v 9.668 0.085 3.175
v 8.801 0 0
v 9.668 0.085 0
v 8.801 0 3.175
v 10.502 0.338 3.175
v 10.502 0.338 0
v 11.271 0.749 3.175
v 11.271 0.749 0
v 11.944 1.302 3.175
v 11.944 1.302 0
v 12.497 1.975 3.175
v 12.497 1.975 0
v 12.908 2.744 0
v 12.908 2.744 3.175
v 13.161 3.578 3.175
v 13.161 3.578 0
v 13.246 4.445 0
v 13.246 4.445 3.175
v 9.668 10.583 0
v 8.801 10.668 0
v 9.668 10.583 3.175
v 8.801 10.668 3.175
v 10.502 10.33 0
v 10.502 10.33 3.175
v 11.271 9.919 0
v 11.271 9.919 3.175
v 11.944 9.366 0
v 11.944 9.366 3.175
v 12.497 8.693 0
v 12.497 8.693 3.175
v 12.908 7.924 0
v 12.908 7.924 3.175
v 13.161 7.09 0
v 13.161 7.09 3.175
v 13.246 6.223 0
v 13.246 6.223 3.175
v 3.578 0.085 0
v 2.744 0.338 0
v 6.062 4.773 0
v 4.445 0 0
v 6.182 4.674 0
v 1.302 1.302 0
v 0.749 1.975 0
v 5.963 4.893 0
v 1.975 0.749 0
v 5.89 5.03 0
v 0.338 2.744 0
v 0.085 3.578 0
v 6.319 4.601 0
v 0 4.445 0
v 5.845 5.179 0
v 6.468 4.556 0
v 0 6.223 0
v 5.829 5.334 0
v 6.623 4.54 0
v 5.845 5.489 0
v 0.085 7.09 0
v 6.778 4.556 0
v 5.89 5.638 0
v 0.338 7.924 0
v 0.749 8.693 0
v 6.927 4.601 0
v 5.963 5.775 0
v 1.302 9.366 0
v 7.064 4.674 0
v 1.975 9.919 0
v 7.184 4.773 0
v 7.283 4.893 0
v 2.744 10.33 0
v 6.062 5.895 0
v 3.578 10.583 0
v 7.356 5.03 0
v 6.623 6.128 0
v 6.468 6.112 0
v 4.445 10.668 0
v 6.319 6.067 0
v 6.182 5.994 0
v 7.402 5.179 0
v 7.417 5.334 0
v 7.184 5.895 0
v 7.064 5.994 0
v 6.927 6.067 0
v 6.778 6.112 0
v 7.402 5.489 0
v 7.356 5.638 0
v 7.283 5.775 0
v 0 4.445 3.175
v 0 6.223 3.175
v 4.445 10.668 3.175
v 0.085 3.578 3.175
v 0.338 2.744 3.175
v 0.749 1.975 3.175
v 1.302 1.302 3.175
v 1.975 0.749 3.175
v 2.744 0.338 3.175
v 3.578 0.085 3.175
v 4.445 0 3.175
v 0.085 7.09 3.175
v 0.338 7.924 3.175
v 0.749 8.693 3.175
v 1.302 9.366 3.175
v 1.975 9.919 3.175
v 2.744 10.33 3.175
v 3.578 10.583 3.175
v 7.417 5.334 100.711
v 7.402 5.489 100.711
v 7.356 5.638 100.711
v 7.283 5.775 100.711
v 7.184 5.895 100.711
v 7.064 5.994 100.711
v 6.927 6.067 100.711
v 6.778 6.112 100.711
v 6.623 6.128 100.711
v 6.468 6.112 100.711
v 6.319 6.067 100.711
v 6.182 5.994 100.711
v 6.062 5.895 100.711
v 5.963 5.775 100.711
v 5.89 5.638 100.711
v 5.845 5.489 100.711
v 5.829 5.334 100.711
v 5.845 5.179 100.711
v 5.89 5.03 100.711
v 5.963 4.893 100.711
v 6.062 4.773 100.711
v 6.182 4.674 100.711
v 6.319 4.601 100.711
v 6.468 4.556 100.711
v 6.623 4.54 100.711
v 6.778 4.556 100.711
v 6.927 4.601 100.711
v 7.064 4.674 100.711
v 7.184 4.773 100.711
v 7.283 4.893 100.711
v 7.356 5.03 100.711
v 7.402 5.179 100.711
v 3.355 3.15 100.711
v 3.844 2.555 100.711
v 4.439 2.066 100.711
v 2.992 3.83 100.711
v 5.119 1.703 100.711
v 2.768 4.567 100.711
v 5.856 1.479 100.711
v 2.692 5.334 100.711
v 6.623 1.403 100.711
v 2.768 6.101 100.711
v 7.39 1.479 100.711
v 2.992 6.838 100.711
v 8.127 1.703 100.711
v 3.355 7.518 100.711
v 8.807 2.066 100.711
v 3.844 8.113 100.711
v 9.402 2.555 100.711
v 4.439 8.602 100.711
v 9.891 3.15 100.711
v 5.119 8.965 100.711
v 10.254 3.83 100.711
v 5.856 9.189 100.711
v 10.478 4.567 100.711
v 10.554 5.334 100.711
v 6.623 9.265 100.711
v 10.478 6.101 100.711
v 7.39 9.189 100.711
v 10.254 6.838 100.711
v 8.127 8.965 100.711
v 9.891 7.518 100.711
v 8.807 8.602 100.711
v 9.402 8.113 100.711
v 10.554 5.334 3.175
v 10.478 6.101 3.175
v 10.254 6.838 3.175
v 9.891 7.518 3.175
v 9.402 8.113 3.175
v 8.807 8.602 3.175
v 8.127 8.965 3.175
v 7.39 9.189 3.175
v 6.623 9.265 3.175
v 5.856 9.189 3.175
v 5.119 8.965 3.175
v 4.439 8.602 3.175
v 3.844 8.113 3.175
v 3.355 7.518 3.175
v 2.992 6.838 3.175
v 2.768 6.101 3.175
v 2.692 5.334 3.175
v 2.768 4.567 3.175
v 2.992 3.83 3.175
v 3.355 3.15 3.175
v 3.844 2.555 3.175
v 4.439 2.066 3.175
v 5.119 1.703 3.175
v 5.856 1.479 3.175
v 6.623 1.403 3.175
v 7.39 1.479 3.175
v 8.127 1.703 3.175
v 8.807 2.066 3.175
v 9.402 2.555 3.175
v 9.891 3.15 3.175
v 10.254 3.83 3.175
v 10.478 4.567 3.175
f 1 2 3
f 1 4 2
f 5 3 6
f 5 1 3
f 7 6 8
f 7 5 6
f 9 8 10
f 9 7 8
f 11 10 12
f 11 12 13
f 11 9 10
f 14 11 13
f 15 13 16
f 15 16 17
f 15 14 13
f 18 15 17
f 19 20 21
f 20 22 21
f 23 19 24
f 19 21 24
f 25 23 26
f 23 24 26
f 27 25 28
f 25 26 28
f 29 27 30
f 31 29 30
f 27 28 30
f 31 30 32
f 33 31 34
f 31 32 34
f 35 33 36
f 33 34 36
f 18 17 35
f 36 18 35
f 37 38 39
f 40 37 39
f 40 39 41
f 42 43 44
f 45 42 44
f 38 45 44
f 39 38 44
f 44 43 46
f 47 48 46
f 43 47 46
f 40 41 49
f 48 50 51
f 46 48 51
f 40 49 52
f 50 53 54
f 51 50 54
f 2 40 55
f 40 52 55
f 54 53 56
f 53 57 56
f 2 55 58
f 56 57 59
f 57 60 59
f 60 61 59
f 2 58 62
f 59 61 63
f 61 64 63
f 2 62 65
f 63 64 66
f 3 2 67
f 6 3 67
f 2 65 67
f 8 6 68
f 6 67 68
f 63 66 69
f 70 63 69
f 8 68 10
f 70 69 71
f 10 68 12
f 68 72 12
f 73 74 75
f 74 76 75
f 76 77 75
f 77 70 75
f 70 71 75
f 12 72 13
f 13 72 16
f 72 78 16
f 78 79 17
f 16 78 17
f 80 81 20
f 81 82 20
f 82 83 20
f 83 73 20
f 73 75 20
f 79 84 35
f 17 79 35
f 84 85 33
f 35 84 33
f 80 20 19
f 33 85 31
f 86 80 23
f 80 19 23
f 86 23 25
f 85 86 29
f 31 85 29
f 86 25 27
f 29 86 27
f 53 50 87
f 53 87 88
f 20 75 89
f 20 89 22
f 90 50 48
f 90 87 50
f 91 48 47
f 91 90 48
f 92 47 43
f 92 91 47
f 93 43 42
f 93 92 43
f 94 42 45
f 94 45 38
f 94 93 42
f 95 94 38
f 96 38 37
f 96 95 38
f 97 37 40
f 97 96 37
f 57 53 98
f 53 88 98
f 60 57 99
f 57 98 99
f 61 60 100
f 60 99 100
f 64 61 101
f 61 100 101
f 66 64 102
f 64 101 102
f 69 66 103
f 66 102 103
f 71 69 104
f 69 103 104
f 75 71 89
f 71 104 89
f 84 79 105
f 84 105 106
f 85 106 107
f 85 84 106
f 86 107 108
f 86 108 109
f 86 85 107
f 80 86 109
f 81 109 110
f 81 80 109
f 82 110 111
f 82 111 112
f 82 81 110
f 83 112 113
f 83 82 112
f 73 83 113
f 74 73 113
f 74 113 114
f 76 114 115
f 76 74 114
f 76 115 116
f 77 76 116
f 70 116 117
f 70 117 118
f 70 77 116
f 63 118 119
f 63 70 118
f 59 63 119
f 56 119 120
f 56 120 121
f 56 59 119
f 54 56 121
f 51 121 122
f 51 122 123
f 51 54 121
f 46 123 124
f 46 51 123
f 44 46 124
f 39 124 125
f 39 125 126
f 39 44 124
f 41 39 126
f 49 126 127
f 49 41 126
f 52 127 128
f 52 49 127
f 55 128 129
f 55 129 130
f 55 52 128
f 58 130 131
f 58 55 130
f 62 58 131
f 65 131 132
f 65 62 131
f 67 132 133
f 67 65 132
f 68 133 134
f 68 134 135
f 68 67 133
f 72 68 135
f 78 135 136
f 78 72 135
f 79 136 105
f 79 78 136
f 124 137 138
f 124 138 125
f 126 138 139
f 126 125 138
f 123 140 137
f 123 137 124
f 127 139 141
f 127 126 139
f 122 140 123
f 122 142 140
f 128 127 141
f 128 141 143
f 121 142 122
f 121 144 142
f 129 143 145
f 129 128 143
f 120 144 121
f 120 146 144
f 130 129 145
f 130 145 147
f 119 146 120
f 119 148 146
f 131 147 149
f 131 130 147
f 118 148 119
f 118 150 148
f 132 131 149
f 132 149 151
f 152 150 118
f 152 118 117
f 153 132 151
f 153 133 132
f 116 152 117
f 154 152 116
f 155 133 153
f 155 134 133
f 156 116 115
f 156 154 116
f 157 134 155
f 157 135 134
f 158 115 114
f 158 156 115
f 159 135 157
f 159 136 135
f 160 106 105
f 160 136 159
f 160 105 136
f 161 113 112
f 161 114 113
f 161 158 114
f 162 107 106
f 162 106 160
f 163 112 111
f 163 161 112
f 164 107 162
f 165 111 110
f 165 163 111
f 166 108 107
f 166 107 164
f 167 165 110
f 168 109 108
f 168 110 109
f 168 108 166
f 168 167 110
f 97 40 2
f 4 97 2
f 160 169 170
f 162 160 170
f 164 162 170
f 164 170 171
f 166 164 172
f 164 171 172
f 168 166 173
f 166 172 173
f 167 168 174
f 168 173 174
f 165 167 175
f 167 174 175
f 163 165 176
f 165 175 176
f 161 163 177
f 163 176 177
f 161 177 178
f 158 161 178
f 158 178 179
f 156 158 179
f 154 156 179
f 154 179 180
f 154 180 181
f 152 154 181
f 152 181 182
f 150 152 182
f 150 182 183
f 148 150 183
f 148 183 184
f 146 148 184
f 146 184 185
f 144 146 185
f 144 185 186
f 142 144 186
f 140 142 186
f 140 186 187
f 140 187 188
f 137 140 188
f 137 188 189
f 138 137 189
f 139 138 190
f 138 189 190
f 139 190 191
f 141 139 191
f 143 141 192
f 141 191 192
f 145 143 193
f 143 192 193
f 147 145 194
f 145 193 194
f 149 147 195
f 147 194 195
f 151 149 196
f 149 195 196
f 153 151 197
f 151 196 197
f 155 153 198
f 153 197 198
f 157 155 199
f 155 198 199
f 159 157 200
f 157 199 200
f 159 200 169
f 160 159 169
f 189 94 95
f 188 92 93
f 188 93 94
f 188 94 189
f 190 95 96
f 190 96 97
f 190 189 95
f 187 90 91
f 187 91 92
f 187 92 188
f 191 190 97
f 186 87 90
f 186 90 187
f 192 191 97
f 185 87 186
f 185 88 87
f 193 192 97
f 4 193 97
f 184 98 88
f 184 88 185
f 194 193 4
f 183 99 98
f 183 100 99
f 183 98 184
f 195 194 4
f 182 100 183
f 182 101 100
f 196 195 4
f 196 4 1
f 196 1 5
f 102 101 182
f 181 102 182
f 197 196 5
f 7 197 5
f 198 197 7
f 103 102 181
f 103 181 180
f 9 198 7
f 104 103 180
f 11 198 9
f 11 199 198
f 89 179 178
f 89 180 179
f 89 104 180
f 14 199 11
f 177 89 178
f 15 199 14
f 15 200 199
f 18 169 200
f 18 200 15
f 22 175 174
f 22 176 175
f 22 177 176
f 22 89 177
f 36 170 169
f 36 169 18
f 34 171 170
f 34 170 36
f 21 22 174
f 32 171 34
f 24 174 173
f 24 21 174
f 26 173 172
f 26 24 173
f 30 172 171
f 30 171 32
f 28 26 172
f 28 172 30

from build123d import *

# Parameters (mm, degrees)
SKETCH1_W           = 13.2461
SKETCH1_H           = 10.668
SKETCH1_R           = 3.93065
BOSS_EXTRUDE1_DEPTH = 3.175
SKETCH1_2_R         = 3.93065
SKETCH1_2_R_2       = 0.79375
BOSS_EXTRUDE2_DEPTH = 100.711
FILLET1_R           = 4.445


with BuildPart() as part:
    # Sketch1 → Boss-Extrude1 (new body)
    with BuildSketch(Plane.XY):
        with Locations((6.62305, 5.334)):
            Rectangle(SKETCH1_W, SKETCH1_H)
        with Locations((6.62305, 5.334)):
            Circle(SKETCH1_R, mode=Mode.SUBTRACT)
    extrude(amount=BOSS_EXTRUDE1_DEPTH)

    # Sketch1<2> → Boss-Extrude2 (add)
    with BuildSketch(Plane.XY):
        with Locations((6.62305, 5.334)):
            Circle(SKETCH1_2_R)
        with Locations((6.62305, 5.334)):
            Circle(SKETCH1_2_R_2, mode=Mode.SUBTRACT)
    extrude(amount=BOSS_EXTRUDE2_DEPTH)

    # Fillet1
    fillet1_edges = [part.edges().sort_by_distance(p)[0] for p in [
        (0, 0, 1.5875),
        (0, 10.668, 1.5875),
        (13.2461, 10.668, 1.5875),
        (13.2461, 0, 1.5875),
    ]]
    fillet(fillet1_edges, radius=FILLET1_R)


solid = part.part
